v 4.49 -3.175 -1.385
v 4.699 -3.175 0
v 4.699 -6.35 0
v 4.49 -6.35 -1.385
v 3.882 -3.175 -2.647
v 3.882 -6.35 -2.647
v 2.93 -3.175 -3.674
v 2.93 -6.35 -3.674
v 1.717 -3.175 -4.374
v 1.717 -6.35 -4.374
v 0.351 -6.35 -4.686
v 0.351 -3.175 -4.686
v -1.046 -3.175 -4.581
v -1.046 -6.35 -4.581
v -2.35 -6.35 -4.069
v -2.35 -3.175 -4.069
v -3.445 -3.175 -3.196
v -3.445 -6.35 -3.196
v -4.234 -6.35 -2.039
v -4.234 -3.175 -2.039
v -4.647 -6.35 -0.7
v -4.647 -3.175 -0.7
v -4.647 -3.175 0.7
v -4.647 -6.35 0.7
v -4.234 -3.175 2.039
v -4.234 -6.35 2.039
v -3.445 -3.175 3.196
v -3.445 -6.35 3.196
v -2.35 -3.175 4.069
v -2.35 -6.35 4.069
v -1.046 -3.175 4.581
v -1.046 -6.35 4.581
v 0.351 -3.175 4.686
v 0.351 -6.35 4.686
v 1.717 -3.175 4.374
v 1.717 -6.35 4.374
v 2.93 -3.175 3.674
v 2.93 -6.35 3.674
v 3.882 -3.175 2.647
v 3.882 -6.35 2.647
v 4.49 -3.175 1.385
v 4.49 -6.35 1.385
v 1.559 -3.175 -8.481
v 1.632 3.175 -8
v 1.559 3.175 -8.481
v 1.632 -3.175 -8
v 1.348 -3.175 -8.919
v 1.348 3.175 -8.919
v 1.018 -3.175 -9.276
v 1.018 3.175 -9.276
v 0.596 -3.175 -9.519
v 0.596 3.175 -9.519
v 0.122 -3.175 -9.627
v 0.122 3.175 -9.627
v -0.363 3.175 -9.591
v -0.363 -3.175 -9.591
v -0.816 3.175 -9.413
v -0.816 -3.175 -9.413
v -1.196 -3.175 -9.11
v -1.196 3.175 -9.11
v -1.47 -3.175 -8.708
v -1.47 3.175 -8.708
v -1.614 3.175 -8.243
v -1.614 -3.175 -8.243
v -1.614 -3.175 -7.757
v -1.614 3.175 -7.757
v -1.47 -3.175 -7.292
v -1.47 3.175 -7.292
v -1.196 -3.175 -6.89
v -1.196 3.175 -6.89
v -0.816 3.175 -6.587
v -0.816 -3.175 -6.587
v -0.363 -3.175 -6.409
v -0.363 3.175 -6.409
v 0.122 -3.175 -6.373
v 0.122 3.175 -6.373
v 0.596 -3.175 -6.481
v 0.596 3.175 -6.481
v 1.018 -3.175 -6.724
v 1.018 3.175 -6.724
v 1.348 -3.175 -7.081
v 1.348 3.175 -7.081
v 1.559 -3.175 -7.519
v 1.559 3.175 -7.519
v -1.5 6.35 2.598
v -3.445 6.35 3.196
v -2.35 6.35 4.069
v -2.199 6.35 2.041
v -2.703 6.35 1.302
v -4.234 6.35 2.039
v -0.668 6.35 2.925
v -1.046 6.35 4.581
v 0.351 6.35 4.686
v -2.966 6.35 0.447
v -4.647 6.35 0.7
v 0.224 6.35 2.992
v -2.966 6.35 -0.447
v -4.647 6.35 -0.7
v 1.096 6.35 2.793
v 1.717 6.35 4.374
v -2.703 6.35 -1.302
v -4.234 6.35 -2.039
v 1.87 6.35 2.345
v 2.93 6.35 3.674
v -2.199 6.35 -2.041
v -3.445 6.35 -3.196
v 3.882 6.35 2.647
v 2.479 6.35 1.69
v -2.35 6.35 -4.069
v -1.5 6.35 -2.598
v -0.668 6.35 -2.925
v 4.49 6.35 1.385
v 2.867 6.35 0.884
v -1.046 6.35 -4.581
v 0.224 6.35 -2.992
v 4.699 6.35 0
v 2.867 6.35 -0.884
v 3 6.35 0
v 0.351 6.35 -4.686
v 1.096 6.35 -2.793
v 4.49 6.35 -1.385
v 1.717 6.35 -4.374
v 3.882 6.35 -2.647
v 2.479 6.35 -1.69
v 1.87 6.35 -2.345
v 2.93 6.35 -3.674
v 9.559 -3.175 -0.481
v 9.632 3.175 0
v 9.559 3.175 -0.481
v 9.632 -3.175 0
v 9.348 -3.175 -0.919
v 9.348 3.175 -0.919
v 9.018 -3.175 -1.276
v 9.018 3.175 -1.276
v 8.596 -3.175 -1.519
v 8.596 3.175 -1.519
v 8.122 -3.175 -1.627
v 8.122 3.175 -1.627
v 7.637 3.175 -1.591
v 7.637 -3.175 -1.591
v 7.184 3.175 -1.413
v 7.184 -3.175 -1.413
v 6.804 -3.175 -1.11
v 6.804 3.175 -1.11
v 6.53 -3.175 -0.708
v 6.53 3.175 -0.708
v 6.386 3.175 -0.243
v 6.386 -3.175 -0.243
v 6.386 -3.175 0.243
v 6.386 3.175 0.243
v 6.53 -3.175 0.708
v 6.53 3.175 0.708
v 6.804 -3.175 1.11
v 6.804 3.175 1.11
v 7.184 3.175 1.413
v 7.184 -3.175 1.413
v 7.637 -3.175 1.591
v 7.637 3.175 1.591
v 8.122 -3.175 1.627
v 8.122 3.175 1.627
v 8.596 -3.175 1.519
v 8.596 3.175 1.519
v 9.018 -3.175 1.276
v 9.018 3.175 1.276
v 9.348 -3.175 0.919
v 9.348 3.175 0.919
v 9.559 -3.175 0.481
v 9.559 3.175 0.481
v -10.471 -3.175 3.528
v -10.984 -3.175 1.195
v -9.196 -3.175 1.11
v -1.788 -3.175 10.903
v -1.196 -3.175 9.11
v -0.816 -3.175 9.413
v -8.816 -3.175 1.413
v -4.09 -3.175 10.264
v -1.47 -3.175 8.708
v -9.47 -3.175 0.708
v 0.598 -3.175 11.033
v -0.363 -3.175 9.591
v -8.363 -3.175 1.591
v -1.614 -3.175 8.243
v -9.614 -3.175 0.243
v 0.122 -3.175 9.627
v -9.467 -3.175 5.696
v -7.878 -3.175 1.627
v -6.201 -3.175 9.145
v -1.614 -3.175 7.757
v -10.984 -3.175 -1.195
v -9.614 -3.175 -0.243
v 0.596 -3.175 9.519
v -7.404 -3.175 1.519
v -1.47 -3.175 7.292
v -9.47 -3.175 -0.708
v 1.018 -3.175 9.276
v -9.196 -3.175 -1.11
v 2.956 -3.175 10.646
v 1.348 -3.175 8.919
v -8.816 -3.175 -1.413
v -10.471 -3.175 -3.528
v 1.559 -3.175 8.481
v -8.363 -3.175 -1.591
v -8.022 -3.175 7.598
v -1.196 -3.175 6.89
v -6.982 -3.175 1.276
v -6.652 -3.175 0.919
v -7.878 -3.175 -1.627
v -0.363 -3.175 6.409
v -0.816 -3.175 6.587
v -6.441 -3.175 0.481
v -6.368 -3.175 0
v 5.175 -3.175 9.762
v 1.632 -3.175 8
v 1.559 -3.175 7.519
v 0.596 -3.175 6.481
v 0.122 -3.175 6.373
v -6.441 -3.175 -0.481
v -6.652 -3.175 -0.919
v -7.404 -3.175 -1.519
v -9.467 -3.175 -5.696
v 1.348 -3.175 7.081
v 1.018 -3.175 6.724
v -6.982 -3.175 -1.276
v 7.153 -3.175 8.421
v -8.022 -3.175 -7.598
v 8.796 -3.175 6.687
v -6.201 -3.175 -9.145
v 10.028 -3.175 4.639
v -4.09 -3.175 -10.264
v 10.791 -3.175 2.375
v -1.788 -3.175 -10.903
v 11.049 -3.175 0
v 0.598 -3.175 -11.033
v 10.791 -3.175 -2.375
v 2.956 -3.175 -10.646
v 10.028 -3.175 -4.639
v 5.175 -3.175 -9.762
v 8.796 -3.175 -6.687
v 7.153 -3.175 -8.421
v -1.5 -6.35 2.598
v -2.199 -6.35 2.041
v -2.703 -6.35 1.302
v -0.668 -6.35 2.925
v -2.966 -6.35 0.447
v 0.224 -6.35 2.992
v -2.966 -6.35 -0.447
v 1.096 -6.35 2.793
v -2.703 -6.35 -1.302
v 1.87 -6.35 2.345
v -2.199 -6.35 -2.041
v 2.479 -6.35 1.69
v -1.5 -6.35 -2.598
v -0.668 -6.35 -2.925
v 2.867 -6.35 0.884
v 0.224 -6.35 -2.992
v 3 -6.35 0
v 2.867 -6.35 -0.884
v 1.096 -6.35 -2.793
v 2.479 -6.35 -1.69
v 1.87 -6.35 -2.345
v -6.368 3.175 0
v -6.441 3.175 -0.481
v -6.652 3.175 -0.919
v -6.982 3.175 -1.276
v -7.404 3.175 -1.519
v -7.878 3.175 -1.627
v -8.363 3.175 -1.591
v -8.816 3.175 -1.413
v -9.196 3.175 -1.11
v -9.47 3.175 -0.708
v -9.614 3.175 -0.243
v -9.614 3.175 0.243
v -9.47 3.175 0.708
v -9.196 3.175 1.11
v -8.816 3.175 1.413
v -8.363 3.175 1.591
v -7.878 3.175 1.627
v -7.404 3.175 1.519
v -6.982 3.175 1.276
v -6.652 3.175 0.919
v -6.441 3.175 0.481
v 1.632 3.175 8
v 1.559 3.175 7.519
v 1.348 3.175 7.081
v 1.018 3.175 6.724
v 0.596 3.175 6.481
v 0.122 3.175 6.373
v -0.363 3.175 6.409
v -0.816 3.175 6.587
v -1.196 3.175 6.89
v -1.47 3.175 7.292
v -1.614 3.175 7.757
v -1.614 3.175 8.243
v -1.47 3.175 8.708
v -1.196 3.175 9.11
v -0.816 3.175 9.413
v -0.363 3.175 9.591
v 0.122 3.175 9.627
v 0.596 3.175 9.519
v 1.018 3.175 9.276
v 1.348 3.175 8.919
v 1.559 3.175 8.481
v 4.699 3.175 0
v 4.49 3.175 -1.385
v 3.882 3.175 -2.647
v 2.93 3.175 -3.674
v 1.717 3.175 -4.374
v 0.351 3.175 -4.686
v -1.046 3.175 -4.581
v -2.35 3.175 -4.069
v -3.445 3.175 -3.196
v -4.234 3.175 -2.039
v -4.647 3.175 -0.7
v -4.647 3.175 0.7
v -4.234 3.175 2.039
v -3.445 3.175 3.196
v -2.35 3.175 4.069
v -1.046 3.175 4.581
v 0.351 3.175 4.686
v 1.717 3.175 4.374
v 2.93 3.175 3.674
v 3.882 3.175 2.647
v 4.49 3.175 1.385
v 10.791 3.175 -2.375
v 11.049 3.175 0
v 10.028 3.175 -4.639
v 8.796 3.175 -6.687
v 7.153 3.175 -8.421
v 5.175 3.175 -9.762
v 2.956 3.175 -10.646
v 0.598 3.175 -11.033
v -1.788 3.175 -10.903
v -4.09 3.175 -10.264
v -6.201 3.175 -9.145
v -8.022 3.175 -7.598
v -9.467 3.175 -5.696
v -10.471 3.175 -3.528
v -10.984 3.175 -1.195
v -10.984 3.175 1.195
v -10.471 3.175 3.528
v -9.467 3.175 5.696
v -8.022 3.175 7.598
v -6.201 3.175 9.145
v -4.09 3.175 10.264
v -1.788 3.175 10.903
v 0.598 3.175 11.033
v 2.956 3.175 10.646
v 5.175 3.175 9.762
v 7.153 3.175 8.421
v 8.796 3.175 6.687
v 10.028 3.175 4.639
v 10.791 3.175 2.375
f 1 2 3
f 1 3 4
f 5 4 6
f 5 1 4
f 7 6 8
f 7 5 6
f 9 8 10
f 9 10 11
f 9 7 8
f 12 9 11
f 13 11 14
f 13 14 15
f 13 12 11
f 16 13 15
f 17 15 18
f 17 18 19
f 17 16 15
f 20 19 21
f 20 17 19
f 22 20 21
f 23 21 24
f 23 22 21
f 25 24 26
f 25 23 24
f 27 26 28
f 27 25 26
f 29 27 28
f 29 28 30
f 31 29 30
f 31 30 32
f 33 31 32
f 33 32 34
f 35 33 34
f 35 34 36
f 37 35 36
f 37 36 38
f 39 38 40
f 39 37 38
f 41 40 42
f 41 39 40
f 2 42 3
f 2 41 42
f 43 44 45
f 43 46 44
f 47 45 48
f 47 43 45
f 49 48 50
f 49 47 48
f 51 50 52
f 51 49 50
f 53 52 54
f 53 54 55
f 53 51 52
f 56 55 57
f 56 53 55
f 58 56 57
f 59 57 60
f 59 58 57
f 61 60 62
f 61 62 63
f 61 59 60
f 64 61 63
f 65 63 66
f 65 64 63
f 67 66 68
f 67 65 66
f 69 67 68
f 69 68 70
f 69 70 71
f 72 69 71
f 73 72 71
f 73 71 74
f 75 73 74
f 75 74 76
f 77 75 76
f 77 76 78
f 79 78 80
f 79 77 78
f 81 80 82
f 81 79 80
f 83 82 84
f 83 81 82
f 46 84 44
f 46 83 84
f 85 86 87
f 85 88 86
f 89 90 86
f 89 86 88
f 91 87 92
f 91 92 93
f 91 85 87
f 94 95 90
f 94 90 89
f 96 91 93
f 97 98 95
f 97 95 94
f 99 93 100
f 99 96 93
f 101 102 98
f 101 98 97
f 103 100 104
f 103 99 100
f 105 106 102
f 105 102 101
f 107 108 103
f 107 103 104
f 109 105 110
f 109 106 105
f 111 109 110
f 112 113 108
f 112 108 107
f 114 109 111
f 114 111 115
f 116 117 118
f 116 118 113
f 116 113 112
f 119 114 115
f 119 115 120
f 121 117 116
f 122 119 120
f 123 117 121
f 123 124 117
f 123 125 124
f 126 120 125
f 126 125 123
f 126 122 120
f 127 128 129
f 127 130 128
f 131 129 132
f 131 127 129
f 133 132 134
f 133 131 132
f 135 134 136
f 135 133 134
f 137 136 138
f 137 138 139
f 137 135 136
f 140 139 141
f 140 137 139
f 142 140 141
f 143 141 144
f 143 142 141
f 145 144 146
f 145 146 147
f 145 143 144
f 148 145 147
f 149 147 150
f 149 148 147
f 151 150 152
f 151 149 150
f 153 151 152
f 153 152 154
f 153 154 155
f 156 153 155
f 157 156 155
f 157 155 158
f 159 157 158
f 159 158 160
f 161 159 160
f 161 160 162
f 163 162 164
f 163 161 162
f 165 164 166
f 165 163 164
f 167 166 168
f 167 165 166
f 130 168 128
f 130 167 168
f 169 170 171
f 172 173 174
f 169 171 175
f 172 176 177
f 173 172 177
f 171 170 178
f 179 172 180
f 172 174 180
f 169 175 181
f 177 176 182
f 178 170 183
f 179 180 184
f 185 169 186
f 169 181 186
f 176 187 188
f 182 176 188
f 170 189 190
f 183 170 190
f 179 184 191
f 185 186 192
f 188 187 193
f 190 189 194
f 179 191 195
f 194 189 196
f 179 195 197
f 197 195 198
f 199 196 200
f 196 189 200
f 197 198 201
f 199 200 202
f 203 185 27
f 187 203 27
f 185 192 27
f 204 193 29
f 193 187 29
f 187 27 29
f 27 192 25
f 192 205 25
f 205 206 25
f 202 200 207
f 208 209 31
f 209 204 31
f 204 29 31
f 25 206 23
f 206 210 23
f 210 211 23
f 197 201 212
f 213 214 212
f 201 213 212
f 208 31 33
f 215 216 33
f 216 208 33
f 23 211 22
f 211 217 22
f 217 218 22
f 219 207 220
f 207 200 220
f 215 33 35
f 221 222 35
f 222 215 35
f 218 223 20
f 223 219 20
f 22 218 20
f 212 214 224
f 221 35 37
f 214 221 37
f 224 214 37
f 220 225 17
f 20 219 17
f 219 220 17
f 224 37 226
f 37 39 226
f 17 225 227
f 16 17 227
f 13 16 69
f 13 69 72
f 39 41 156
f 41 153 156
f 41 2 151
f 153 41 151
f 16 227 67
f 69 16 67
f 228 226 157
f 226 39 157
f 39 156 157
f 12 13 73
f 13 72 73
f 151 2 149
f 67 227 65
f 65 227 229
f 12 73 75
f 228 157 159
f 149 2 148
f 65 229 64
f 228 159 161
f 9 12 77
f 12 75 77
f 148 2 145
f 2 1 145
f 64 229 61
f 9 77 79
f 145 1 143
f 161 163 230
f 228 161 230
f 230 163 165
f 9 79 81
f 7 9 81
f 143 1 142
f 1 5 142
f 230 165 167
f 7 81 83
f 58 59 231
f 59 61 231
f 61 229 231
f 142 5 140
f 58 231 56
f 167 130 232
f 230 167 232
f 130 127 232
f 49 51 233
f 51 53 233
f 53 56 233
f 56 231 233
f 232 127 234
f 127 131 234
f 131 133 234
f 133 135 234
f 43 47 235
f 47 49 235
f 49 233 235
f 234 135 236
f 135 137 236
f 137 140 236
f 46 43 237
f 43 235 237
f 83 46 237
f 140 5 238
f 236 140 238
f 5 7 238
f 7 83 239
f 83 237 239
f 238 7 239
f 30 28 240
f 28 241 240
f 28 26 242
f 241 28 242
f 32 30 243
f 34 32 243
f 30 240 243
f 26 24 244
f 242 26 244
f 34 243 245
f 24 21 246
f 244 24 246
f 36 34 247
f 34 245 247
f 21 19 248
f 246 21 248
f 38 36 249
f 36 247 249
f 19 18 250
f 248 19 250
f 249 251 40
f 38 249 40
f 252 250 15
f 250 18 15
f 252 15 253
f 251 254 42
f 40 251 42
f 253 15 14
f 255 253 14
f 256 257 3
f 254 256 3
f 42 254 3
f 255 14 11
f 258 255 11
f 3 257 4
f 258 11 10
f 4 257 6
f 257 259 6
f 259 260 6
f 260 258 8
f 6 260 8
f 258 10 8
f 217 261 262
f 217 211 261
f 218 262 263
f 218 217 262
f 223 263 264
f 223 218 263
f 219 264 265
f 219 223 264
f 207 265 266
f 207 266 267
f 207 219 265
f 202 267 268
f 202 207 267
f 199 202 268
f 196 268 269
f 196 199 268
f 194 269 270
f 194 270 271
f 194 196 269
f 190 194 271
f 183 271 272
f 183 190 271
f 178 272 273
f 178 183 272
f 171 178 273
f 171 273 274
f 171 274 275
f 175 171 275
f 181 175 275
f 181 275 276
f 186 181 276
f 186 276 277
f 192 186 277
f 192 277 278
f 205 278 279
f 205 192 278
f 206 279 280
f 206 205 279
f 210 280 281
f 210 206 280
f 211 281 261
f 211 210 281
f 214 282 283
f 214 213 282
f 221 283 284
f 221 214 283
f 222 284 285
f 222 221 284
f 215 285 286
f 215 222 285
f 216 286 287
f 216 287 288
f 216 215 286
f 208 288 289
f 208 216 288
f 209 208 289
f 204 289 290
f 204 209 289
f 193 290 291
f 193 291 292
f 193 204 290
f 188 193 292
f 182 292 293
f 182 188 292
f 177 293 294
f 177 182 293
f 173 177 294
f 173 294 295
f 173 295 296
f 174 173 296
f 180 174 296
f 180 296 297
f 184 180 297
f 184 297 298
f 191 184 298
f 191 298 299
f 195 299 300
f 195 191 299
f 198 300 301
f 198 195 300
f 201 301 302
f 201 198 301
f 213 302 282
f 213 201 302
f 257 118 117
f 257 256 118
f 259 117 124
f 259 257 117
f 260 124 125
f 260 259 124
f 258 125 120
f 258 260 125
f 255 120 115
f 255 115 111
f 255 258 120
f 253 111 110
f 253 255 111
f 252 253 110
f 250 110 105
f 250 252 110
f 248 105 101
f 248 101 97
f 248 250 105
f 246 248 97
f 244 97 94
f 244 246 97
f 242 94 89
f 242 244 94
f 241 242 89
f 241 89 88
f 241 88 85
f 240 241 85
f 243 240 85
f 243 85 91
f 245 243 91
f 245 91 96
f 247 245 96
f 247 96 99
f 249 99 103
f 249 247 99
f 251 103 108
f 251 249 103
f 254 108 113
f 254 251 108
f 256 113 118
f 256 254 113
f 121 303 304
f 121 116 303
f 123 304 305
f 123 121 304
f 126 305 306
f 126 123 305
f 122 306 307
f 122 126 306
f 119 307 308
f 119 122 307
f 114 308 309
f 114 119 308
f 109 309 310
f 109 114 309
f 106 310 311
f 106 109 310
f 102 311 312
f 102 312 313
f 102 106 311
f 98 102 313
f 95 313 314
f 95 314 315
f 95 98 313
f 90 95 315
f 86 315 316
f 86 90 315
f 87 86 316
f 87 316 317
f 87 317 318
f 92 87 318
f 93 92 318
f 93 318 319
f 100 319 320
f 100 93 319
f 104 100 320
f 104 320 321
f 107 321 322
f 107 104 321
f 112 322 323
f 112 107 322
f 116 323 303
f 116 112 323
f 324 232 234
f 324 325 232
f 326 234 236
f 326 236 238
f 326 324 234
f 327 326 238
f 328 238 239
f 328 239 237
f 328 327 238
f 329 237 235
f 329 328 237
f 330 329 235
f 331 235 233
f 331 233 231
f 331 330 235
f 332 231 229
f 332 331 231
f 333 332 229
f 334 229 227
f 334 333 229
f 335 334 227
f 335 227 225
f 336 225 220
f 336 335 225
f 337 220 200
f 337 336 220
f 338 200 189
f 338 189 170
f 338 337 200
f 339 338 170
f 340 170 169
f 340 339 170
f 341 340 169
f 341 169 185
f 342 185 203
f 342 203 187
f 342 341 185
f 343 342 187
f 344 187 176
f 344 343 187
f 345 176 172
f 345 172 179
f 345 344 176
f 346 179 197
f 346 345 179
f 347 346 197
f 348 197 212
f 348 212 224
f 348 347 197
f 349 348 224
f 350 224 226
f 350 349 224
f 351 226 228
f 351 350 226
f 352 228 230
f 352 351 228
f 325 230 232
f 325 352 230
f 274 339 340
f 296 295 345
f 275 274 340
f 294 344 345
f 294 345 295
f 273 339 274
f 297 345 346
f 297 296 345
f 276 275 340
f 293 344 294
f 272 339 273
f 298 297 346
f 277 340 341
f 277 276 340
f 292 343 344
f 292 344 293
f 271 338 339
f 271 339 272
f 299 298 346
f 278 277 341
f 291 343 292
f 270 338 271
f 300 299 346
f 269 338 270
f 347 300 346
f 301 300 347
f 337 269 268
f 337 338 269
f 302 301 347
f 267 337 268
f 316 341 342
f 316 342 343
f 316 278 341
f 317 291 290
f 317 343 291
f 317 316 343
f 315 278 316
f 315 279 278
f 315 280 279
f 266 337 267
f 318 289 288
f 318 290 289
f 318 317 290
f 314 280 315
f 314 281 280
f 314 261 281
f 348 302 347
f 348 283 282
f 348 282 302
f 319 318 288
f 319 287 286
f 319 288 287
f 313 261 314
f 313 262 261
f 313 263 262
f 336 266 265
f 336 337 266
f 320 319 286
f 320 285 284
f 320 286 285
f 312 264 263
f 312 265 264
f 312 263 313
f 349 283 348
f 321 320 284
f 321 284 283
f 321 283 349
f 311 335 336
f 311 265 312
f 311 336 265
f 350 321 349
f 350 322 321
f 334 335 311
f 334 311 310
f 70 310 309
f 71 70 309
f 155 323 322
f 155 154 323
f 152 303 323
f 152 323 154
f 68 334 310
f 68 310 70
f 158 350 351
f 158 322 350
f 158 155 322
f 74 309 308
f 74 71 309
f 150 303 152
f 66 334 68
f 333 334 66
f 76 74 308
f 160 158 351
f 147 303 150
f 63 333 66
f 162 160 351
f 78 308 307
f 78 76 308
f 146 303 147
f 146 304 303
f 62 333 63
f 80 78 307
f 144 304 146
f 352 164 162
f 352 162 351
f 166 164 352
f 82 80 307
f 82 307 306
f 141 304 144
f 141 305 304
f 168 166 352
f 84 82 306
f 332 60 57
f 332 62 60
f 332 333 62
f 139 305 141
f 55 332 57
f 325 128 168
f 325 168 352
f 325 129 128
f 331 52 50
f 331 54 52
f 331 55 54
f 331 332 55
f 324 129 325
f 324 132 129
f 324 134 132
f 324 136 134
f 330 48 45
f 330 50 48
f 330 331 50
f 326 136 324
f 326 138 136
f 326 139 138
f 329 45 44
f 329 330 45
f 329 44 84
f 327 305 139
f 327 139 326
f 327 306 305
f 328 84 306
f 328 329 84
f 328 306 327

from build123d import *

# Parameters (mm, degrees)
SKETCH1_R           = 4.699
SKETCH1_R_2         = 3
BOSS_EXTRUDE1_DEPTH = 6.35
SKETCH1_3_R         = 11.049
SKETCH1_3_R_2       = 1.63195
SKETCH1_3_R_3       = 4.699
BOSS_EXTRUDE2_DEPTH = 3.175


with BuildPart() as part:
    # Sketch1 → Boss-Extrude1 (new, symmetric)
    with BuildSketch(Plane(origin=(0, 0, 0), x_dir=(1, 0, 0), z_dir=(0, 1, 0))):
        Circle(SKETCH1_R)
        Circle(SKETCH1_R_2, mode=Mode.SUBTRACT)
    extrude(amount=BOSS_EXTRUDE1_DEPTH, both=True)

    # Sketch1<3> → Boss-Extrude2 (add, symmetric)
    with BuildSketch(Plane(origin=(0, 0, 0), x_dir=(1, 0, 0), z_dir=(0, 1, 0))):
        Circle(SKETCH1_3_R)
        with Locations((-8, 0)):
            Circle(SKETCH1_3_R_2, mode=Mode.SUBTRACT)
        Circle(SKETCH1_3_R_3, mode=Mode.SUBTRACT)
        with Locations((0, -8)):
            Circle(SKETCH1_3_R_2, mode=Mode.SUBTRACT)
        with Locations((0, 8)):
            Circle(SKETCH1_3_R_2, mode=Mode.SUBTRACT)
        with Locations((8, 0)):
            Circle(SKETCH1_3_R_2, mode=Mode.SUBTRACT)
    extrude(amount=BOSS_EXTRUDE2_DEPTH, both=True)


solid = part.part
